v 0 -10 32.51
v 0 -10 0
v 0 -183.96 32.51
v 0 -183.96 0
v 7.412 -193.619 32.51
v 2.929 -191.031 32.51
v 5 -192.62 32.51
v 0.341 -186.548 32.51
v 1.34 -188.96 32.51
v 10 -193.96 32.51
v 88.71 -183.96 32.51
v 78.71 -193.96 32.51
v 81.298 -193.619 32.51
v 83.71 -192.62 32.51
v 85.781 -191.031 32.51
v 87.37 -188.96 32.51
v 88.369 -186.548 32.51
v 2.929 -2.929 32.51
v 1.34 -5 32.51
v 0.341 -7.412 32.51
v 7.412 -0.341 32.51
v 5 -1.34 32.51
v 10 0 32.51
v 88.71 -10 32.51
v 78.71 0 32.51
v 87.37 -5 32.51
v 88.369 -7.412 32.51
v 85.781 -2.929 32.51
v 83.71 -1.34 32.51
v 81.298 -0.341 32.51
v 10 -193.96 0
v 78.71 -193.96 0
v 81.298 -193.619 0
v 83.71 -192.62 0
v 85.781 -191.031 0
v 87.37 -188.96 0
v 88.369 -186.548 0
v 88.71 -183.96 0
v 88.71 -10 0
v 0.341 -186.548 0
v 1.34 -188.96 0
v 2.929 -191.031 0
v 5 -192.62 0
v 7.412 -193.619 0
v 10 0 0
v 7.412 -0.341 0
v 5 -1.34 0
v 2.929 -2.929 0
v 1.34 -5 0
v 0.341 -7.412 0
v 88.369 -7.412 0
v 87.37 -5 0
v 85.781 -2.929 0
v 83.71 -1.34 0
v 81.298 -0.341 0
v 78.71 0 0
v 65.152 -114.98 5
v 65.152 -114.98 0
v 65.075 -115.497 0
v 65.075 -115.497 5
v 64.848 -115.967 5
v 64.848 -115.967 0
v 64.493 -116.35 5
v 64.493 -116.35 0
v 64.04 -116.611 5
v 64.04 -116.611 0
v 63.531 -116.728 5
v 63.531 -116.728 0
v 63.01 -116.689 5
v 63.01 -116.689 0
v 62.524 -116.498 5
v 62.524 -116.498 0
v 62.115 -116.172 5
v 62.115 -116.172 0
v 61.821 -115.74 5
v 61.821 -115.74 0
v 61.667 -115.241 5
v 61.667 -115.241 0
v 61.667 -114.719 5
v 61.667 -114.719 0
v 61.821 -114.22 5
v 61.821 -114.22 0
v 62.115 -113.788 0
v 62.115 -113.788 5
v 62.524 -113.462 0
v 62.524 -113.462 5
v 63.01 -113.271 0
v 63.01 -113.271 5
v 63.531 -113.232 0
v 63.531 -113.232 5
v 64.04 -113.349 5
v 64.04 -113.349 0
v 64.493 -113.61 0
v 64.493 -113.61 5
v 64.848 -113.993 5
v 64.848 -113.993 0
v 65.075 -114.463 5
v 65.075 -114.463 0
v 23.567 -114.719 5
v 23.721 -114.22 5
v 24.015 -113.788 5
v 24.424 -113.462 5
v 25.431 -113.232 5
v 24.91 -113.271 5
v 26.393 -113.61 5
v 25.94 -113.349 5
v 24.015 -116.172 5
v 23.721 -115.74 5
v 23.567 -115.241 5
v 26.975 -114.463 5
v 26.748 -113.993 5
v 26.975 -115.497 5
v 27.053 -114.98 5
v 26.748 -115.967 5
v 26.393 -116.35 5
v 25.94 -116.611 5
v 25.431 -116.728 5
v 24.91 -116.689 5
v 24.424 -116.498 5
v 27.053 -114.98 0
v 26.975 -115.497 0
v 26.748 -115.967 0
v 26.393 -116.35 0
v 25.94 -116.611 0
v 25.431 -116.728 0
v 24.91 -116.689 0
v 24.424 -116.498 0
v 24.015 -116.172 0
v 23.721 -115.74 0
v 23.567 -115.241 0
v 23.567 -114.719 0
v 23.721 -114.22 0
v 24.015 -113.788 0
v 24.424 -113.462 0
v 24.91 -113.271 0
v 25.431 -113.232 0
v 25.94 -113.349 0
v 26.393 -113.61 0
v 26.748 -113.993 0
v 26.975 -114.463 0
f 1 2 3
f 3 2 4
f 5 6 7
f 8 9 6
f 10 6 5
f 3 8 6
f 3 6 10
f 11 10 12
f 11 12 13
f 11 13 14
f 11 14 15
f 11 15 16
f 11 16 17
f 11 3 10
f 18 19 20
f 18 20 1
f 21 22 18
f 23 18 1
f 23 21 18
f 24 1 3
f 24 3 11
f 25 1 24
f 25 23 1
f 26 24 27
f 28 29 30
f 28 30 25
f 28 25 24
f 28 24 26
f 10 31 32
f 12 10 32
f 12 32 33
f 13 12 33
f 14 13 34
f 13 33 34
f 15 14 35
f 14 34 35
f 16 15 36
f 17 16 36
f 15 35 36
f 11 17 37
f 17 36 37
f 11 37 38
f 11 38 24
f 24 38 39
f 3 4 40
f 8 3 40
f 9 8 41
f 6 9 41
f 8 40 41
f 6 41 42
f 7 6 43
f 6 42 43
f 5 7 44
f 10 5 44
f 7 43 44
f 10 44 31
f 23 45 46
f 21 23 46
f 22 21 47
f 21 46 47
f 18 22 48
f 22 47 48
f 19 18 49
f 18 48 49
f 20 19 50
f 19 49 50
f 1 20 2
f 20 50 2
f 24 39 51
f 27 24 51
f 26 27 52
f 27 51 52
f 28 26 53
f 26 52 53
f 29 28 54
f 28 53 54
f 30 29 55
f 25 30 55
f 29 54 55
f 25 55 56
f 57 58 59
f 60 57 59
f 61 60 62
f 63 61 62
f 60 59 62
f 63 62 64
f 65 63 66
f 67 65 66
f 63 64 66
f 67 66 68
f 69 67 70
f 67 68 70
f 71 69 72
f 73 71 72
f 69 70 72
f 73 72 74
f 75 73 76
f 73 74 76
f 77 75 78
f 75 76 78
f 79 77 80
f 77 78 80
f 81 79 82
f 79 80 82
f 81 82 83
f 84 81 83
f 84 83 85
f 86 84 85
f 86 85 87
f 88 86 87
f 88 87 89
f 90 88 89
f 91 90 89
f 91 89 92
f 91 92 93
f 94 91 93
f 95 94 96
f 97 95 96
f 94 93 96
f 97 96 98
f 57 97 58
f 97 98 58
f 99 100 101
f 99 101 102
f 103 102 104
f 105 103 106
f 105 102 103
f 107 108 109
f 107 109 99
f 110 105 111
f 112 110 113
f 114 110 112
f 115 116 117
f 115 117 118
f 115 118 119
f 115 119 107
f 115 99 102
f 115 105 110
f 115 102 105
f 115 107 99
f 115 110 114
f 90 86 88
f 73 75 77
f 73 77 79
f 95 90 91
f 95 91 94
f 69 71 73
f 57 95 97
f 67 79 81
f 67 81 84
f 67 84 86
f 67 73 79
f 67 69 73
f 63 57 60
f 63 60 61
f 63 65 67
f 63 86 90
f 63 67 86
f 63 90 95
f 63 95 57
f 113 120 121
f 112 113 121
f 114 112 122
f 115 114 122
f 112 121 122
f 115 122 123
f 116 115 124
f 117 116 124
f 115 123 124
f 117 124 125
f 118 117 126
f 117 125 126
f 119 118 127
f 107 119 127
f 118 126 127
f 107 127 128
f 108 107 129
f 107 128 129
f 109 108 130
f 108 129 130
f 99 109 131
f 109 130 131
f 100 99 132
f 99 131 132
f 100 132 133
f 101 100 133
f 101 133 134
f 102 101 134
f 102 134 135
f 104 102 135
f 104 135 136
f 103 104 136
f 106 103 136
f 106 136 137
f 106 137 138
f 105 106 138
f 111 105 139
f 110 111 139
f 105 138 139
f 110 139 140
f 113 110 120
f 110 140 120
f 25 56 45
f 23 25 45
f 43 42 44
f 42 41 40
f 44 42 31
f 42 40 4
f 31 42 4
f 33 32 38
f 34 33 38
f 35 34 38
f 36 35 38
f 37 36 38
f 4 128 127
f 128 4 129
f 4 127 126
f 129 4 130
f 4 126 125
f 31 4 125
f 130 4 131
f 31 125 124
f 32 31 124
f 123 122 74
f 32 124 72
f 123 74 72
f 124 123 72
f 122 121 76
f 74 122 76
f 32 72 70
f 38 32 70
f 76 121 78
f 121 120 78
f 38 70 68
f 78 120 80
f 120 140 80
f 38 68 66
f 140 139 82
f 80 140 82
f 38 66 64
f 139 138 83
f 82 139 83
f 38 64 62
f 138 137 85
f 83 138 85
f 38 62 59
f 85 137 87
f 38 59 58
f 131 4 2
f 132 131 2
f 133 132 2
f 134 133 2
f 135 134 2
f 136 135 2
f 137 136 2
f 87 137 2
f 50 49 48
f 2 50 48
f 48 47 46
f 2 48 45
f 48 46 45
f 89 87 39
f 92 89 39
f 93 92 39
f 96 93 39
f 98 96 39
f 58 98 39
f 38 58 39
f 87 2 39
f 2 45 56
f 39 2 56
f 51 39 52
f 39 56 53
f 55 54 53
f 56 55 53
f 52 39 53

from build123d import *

# Parameters (mm, degrees)
F1_DEPTH = 32.51
F2_R     = 1.7525
F3_DEPTH = 5


with BuildPart() as f1:
    # F0 (on Top) → F1 (new body)
    with BuildSketch(Plane.XY):
        with BuildLine():
            Line((78.71, 0), (10, 0))
            ThreePointArc((10, 0), (2.928932, -2.928932), (0, -10))
            Line((0, -10), (0, -183.96))
            ThreePointArc((0, -183.96), (2.928932, -191.031068), (10, -193.96))
            Line((10, -193.96), (78.71, -193.96))
            ThreePointArc((78.71, -193.96), (85.781068, -191.031068), (88.71, -183.96))
            Line((88.71, -183.96), (88.71, -10))
            ThreePointArc((88.71, -10), (85.781068, -2.928932), (78.71, 0))
        make_face()
    extrude(amount=F1_DEPTH)

    # F2 (on face) → F3 (cut)
    with BuildSketch(Plane(origin=(0, 0, 0), x_dir=(1, 0, 0), z_dir=(0, 0, -1))):
        with Locations((63.4, 114.98)):
            Circle(F2_R)
        with Locations((25.3, 114.98)):
            Circle(F2_R)
    extrude(amount=-F3_DEPTH, mode=Mode.SUBTRACT)


solid = f1.part
